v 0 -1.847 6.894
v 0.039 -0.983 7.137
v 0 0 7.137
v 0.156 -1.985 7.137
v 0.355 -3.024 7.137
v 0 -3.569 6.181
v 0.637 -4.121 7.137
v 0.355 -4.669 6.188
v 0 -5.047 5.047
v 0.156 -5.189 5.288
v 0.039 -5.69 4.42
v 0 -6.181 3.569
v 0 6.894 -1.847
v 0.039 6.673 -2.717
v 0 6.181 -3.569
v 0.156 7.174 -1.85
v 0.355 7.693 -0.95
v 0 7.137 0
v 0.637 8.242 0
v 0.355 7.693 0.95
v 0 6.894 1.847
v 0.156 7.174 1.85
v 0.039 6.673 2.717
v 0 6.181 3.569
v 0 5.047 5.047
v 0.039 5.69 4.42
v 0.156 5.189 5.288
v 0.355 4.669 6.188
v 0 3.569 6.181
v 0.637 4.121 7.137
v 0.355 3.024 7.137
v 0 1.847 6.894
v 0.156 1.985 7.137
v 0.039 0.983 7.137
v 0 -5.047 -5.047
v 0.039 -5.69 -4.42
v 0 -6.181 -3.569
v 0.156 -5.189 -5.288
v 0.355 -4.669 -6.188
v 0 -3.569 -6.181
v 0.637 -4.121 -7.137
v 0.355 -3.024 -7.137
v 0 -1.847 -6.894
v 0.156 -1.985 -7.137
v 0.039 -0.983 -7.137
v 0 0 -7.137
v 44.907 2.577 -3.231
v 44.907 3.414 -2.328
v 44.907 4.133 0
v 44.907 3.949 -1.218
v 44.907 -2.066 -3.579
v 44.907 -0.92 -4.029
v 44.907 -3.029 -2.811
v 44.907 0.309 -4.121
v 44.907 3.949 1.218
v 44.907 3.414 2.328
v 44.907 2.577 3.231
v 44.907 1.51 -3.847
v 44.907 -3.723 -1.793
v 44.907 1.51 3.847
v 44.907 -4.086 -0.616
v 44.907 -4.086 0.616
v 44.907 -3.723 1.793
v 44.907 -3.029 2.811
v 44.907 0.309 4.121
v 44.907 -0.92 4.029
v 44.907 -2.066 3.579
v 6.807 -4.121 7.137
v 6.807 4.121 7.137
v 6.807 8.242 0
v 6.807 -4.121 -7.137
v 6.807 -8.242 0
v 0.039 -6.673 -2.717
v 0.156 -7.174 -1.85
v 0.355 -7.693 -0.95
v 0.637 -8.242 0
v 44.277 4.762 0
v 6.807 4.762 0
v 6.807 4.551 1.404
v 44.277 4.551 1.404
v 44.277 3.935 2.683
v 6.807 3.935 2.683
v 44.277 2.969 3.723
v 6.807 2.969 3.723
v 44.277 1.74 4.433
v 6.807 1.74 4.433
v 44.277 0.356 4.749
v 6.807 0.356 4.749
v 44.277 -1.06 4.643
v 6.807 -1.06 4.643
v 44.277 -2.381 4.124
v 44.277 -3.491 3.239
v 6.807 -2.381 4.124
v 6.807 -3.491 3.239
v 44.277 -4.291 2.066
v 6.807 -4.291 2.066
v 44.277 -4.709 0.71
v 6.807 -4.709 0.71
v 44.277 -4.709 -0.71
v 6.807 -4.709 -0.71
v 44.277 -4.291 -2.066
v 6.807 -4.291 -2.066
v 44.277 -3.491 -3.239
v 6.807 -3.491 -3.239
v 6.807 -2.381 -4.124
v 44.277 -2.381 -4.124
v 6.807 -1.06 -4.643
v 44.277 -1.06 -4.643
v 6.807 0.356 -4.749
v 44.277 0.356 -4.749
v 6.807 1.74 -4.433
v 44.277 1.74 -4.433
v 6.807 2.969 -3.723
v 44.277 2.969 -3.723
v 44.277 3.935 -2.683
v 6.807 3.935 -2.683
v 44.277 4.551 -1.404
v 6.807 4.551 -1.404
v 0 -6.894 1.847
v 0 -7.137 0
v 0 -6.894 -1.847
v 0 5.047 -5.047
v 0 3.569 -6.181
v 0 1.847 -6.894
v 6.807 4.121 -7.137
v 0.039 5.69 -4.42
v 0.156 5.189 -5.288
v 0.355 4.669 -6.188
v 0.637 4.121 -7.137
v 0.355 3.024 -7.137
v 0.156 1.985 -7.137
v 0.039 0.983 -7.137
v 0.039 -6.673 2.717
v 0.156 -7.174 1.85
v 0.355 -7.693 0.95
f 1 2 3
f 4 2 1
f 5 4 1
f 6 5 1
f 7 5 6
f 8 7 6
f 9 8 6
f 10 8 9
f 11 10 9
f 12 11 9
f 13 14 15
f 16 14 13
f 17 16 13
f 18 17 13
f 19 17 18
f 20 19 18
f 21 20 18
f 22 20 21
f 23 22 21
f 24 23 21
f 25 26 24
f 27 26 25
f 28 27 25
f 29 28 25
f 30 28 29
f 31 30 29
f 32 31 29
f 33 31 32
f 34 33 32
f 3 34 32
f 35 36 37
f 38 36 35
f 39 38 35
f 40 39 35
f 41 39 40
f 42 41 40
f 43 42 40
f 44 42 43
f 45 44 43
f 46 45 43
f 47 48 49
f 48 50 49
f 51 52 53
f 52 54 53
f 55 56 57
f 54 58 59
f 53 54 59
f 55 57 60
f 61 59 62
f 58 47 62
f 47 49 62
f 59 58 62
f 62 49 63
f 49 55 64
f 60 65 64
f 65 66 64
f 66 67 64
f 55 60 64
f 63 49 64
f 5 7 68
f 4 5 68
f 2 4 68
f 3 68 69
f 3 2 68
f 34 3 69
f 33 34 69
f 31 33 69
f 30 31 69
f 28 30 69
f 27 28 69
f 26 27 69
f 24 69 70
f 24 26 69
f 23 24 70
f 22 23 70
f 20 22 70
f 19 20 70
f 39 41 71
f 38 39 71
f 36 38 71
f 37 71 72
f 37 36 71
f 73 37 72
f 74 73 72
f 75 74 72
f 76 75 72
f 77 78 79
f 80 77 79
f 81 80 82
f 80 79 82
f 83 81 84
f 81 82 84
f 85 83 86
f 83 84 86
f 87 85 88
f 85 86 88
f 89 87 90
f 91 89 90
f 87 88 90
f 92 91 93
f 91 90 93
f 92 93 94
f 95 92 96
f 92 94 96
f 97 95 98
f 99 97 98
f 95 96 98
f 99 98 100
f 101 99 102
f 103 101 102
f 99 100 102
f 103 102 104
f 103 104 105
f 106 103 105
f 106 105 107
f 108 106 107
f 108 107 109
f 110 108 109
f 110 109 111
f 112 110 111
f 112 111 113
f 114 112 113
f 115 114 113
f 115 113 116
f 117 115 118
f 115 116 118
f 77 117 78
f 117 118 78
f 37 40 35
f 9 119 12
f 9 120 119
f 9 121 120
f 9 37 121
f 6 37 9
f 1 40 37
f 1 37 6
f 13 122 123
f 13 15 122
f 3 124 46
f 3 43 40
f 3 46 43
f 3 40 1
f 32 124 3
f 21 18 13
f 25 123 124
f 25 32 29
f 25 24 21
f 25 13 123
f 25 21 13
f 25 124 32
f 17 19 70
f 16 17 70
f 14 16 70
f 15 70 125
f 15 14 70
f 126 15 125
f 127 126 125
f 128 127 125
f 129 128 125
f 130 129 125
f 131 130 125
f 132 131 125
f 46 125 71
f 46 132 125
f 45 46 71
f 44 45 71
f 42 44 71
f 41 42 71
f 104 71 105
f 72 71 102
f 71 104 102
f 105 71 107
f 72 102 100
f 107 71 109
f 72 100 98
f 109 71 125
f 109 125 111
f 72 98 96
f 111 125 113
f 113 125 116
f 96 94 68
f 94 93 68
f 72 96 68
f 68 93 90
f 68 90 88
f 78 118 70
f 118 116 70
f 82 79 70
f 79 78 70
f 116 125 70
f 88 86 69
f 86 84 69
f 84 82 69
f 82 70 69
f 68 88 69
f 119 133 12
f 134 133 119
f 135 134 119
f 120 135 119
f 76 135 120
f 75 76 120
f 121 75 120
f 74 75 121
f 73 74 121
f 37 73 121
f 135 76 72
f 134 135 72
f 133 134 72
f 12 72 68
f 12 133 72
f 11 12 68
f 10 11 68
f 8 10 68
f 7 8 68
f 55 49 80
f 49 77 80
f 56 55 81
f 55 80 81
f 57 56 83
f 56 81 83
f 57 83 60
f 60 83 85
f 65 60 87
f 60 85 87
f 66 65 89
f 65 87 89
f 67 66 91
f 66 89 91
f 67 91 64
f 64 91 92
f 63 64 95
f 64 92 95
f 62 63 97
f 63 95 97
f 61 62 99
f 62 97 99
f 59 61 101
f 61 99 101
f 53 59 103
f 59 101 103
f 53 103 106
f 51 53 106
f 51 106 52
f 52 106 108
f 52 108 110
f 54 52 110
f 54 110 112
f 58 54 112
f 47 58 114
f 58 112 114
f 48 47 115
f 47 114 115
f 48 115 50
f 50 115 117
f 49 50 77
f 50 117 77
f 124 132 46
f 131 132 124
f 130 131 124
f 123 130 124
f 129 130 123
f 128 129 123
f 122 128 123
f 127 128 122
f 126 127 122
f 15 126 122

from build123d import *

# Parameters (mm, degrees)
BASEHEAD_DEPTH = 6.8072


with BuildPart() as part:
    # Sketch1 → BaseHead (new body)
    with BuildSketch(Plane(origin=(0, 0, 0), x_dir=(0, 0, -1), z_dir=(1, 0, 0))):
        Polygon((7.1374, 4.120779811), (7.1374, -4.120779811), (0, -8.241559623), (-7.1374, -4.120779811), (-7.1374, 4.120779811), (0, 8.241559623), align=None)
    extrude(amount=BASEHEAD_DEPTH)

    # BodySke → BaseBody (revolve)
    with BuildSketch(Plane.XY):
        Polygon((0, 0), (44.9072, 0), (44.9072, 4.13258), (44.27728, 4.7625), (0, 4.7625), align=None)
    revolve(axis=Axis((0, 0, 0), (1, 0, 0)))

    # Sketch3 → HeadChamfer (revolve, cut)
    with BuildSketch(Plane.XY):
        Polygon((0, 7.1374), (4.303661065, 14.591559623), (4.303661065, 20.941559623), (-12.7, 20.941559623), (-12.7, 7.1374), align=None)
    revolve(axis=Axis((0, 0, 0), (1, 0, 0)), mode=Mode.SUBTRACT)


solid = part.part
